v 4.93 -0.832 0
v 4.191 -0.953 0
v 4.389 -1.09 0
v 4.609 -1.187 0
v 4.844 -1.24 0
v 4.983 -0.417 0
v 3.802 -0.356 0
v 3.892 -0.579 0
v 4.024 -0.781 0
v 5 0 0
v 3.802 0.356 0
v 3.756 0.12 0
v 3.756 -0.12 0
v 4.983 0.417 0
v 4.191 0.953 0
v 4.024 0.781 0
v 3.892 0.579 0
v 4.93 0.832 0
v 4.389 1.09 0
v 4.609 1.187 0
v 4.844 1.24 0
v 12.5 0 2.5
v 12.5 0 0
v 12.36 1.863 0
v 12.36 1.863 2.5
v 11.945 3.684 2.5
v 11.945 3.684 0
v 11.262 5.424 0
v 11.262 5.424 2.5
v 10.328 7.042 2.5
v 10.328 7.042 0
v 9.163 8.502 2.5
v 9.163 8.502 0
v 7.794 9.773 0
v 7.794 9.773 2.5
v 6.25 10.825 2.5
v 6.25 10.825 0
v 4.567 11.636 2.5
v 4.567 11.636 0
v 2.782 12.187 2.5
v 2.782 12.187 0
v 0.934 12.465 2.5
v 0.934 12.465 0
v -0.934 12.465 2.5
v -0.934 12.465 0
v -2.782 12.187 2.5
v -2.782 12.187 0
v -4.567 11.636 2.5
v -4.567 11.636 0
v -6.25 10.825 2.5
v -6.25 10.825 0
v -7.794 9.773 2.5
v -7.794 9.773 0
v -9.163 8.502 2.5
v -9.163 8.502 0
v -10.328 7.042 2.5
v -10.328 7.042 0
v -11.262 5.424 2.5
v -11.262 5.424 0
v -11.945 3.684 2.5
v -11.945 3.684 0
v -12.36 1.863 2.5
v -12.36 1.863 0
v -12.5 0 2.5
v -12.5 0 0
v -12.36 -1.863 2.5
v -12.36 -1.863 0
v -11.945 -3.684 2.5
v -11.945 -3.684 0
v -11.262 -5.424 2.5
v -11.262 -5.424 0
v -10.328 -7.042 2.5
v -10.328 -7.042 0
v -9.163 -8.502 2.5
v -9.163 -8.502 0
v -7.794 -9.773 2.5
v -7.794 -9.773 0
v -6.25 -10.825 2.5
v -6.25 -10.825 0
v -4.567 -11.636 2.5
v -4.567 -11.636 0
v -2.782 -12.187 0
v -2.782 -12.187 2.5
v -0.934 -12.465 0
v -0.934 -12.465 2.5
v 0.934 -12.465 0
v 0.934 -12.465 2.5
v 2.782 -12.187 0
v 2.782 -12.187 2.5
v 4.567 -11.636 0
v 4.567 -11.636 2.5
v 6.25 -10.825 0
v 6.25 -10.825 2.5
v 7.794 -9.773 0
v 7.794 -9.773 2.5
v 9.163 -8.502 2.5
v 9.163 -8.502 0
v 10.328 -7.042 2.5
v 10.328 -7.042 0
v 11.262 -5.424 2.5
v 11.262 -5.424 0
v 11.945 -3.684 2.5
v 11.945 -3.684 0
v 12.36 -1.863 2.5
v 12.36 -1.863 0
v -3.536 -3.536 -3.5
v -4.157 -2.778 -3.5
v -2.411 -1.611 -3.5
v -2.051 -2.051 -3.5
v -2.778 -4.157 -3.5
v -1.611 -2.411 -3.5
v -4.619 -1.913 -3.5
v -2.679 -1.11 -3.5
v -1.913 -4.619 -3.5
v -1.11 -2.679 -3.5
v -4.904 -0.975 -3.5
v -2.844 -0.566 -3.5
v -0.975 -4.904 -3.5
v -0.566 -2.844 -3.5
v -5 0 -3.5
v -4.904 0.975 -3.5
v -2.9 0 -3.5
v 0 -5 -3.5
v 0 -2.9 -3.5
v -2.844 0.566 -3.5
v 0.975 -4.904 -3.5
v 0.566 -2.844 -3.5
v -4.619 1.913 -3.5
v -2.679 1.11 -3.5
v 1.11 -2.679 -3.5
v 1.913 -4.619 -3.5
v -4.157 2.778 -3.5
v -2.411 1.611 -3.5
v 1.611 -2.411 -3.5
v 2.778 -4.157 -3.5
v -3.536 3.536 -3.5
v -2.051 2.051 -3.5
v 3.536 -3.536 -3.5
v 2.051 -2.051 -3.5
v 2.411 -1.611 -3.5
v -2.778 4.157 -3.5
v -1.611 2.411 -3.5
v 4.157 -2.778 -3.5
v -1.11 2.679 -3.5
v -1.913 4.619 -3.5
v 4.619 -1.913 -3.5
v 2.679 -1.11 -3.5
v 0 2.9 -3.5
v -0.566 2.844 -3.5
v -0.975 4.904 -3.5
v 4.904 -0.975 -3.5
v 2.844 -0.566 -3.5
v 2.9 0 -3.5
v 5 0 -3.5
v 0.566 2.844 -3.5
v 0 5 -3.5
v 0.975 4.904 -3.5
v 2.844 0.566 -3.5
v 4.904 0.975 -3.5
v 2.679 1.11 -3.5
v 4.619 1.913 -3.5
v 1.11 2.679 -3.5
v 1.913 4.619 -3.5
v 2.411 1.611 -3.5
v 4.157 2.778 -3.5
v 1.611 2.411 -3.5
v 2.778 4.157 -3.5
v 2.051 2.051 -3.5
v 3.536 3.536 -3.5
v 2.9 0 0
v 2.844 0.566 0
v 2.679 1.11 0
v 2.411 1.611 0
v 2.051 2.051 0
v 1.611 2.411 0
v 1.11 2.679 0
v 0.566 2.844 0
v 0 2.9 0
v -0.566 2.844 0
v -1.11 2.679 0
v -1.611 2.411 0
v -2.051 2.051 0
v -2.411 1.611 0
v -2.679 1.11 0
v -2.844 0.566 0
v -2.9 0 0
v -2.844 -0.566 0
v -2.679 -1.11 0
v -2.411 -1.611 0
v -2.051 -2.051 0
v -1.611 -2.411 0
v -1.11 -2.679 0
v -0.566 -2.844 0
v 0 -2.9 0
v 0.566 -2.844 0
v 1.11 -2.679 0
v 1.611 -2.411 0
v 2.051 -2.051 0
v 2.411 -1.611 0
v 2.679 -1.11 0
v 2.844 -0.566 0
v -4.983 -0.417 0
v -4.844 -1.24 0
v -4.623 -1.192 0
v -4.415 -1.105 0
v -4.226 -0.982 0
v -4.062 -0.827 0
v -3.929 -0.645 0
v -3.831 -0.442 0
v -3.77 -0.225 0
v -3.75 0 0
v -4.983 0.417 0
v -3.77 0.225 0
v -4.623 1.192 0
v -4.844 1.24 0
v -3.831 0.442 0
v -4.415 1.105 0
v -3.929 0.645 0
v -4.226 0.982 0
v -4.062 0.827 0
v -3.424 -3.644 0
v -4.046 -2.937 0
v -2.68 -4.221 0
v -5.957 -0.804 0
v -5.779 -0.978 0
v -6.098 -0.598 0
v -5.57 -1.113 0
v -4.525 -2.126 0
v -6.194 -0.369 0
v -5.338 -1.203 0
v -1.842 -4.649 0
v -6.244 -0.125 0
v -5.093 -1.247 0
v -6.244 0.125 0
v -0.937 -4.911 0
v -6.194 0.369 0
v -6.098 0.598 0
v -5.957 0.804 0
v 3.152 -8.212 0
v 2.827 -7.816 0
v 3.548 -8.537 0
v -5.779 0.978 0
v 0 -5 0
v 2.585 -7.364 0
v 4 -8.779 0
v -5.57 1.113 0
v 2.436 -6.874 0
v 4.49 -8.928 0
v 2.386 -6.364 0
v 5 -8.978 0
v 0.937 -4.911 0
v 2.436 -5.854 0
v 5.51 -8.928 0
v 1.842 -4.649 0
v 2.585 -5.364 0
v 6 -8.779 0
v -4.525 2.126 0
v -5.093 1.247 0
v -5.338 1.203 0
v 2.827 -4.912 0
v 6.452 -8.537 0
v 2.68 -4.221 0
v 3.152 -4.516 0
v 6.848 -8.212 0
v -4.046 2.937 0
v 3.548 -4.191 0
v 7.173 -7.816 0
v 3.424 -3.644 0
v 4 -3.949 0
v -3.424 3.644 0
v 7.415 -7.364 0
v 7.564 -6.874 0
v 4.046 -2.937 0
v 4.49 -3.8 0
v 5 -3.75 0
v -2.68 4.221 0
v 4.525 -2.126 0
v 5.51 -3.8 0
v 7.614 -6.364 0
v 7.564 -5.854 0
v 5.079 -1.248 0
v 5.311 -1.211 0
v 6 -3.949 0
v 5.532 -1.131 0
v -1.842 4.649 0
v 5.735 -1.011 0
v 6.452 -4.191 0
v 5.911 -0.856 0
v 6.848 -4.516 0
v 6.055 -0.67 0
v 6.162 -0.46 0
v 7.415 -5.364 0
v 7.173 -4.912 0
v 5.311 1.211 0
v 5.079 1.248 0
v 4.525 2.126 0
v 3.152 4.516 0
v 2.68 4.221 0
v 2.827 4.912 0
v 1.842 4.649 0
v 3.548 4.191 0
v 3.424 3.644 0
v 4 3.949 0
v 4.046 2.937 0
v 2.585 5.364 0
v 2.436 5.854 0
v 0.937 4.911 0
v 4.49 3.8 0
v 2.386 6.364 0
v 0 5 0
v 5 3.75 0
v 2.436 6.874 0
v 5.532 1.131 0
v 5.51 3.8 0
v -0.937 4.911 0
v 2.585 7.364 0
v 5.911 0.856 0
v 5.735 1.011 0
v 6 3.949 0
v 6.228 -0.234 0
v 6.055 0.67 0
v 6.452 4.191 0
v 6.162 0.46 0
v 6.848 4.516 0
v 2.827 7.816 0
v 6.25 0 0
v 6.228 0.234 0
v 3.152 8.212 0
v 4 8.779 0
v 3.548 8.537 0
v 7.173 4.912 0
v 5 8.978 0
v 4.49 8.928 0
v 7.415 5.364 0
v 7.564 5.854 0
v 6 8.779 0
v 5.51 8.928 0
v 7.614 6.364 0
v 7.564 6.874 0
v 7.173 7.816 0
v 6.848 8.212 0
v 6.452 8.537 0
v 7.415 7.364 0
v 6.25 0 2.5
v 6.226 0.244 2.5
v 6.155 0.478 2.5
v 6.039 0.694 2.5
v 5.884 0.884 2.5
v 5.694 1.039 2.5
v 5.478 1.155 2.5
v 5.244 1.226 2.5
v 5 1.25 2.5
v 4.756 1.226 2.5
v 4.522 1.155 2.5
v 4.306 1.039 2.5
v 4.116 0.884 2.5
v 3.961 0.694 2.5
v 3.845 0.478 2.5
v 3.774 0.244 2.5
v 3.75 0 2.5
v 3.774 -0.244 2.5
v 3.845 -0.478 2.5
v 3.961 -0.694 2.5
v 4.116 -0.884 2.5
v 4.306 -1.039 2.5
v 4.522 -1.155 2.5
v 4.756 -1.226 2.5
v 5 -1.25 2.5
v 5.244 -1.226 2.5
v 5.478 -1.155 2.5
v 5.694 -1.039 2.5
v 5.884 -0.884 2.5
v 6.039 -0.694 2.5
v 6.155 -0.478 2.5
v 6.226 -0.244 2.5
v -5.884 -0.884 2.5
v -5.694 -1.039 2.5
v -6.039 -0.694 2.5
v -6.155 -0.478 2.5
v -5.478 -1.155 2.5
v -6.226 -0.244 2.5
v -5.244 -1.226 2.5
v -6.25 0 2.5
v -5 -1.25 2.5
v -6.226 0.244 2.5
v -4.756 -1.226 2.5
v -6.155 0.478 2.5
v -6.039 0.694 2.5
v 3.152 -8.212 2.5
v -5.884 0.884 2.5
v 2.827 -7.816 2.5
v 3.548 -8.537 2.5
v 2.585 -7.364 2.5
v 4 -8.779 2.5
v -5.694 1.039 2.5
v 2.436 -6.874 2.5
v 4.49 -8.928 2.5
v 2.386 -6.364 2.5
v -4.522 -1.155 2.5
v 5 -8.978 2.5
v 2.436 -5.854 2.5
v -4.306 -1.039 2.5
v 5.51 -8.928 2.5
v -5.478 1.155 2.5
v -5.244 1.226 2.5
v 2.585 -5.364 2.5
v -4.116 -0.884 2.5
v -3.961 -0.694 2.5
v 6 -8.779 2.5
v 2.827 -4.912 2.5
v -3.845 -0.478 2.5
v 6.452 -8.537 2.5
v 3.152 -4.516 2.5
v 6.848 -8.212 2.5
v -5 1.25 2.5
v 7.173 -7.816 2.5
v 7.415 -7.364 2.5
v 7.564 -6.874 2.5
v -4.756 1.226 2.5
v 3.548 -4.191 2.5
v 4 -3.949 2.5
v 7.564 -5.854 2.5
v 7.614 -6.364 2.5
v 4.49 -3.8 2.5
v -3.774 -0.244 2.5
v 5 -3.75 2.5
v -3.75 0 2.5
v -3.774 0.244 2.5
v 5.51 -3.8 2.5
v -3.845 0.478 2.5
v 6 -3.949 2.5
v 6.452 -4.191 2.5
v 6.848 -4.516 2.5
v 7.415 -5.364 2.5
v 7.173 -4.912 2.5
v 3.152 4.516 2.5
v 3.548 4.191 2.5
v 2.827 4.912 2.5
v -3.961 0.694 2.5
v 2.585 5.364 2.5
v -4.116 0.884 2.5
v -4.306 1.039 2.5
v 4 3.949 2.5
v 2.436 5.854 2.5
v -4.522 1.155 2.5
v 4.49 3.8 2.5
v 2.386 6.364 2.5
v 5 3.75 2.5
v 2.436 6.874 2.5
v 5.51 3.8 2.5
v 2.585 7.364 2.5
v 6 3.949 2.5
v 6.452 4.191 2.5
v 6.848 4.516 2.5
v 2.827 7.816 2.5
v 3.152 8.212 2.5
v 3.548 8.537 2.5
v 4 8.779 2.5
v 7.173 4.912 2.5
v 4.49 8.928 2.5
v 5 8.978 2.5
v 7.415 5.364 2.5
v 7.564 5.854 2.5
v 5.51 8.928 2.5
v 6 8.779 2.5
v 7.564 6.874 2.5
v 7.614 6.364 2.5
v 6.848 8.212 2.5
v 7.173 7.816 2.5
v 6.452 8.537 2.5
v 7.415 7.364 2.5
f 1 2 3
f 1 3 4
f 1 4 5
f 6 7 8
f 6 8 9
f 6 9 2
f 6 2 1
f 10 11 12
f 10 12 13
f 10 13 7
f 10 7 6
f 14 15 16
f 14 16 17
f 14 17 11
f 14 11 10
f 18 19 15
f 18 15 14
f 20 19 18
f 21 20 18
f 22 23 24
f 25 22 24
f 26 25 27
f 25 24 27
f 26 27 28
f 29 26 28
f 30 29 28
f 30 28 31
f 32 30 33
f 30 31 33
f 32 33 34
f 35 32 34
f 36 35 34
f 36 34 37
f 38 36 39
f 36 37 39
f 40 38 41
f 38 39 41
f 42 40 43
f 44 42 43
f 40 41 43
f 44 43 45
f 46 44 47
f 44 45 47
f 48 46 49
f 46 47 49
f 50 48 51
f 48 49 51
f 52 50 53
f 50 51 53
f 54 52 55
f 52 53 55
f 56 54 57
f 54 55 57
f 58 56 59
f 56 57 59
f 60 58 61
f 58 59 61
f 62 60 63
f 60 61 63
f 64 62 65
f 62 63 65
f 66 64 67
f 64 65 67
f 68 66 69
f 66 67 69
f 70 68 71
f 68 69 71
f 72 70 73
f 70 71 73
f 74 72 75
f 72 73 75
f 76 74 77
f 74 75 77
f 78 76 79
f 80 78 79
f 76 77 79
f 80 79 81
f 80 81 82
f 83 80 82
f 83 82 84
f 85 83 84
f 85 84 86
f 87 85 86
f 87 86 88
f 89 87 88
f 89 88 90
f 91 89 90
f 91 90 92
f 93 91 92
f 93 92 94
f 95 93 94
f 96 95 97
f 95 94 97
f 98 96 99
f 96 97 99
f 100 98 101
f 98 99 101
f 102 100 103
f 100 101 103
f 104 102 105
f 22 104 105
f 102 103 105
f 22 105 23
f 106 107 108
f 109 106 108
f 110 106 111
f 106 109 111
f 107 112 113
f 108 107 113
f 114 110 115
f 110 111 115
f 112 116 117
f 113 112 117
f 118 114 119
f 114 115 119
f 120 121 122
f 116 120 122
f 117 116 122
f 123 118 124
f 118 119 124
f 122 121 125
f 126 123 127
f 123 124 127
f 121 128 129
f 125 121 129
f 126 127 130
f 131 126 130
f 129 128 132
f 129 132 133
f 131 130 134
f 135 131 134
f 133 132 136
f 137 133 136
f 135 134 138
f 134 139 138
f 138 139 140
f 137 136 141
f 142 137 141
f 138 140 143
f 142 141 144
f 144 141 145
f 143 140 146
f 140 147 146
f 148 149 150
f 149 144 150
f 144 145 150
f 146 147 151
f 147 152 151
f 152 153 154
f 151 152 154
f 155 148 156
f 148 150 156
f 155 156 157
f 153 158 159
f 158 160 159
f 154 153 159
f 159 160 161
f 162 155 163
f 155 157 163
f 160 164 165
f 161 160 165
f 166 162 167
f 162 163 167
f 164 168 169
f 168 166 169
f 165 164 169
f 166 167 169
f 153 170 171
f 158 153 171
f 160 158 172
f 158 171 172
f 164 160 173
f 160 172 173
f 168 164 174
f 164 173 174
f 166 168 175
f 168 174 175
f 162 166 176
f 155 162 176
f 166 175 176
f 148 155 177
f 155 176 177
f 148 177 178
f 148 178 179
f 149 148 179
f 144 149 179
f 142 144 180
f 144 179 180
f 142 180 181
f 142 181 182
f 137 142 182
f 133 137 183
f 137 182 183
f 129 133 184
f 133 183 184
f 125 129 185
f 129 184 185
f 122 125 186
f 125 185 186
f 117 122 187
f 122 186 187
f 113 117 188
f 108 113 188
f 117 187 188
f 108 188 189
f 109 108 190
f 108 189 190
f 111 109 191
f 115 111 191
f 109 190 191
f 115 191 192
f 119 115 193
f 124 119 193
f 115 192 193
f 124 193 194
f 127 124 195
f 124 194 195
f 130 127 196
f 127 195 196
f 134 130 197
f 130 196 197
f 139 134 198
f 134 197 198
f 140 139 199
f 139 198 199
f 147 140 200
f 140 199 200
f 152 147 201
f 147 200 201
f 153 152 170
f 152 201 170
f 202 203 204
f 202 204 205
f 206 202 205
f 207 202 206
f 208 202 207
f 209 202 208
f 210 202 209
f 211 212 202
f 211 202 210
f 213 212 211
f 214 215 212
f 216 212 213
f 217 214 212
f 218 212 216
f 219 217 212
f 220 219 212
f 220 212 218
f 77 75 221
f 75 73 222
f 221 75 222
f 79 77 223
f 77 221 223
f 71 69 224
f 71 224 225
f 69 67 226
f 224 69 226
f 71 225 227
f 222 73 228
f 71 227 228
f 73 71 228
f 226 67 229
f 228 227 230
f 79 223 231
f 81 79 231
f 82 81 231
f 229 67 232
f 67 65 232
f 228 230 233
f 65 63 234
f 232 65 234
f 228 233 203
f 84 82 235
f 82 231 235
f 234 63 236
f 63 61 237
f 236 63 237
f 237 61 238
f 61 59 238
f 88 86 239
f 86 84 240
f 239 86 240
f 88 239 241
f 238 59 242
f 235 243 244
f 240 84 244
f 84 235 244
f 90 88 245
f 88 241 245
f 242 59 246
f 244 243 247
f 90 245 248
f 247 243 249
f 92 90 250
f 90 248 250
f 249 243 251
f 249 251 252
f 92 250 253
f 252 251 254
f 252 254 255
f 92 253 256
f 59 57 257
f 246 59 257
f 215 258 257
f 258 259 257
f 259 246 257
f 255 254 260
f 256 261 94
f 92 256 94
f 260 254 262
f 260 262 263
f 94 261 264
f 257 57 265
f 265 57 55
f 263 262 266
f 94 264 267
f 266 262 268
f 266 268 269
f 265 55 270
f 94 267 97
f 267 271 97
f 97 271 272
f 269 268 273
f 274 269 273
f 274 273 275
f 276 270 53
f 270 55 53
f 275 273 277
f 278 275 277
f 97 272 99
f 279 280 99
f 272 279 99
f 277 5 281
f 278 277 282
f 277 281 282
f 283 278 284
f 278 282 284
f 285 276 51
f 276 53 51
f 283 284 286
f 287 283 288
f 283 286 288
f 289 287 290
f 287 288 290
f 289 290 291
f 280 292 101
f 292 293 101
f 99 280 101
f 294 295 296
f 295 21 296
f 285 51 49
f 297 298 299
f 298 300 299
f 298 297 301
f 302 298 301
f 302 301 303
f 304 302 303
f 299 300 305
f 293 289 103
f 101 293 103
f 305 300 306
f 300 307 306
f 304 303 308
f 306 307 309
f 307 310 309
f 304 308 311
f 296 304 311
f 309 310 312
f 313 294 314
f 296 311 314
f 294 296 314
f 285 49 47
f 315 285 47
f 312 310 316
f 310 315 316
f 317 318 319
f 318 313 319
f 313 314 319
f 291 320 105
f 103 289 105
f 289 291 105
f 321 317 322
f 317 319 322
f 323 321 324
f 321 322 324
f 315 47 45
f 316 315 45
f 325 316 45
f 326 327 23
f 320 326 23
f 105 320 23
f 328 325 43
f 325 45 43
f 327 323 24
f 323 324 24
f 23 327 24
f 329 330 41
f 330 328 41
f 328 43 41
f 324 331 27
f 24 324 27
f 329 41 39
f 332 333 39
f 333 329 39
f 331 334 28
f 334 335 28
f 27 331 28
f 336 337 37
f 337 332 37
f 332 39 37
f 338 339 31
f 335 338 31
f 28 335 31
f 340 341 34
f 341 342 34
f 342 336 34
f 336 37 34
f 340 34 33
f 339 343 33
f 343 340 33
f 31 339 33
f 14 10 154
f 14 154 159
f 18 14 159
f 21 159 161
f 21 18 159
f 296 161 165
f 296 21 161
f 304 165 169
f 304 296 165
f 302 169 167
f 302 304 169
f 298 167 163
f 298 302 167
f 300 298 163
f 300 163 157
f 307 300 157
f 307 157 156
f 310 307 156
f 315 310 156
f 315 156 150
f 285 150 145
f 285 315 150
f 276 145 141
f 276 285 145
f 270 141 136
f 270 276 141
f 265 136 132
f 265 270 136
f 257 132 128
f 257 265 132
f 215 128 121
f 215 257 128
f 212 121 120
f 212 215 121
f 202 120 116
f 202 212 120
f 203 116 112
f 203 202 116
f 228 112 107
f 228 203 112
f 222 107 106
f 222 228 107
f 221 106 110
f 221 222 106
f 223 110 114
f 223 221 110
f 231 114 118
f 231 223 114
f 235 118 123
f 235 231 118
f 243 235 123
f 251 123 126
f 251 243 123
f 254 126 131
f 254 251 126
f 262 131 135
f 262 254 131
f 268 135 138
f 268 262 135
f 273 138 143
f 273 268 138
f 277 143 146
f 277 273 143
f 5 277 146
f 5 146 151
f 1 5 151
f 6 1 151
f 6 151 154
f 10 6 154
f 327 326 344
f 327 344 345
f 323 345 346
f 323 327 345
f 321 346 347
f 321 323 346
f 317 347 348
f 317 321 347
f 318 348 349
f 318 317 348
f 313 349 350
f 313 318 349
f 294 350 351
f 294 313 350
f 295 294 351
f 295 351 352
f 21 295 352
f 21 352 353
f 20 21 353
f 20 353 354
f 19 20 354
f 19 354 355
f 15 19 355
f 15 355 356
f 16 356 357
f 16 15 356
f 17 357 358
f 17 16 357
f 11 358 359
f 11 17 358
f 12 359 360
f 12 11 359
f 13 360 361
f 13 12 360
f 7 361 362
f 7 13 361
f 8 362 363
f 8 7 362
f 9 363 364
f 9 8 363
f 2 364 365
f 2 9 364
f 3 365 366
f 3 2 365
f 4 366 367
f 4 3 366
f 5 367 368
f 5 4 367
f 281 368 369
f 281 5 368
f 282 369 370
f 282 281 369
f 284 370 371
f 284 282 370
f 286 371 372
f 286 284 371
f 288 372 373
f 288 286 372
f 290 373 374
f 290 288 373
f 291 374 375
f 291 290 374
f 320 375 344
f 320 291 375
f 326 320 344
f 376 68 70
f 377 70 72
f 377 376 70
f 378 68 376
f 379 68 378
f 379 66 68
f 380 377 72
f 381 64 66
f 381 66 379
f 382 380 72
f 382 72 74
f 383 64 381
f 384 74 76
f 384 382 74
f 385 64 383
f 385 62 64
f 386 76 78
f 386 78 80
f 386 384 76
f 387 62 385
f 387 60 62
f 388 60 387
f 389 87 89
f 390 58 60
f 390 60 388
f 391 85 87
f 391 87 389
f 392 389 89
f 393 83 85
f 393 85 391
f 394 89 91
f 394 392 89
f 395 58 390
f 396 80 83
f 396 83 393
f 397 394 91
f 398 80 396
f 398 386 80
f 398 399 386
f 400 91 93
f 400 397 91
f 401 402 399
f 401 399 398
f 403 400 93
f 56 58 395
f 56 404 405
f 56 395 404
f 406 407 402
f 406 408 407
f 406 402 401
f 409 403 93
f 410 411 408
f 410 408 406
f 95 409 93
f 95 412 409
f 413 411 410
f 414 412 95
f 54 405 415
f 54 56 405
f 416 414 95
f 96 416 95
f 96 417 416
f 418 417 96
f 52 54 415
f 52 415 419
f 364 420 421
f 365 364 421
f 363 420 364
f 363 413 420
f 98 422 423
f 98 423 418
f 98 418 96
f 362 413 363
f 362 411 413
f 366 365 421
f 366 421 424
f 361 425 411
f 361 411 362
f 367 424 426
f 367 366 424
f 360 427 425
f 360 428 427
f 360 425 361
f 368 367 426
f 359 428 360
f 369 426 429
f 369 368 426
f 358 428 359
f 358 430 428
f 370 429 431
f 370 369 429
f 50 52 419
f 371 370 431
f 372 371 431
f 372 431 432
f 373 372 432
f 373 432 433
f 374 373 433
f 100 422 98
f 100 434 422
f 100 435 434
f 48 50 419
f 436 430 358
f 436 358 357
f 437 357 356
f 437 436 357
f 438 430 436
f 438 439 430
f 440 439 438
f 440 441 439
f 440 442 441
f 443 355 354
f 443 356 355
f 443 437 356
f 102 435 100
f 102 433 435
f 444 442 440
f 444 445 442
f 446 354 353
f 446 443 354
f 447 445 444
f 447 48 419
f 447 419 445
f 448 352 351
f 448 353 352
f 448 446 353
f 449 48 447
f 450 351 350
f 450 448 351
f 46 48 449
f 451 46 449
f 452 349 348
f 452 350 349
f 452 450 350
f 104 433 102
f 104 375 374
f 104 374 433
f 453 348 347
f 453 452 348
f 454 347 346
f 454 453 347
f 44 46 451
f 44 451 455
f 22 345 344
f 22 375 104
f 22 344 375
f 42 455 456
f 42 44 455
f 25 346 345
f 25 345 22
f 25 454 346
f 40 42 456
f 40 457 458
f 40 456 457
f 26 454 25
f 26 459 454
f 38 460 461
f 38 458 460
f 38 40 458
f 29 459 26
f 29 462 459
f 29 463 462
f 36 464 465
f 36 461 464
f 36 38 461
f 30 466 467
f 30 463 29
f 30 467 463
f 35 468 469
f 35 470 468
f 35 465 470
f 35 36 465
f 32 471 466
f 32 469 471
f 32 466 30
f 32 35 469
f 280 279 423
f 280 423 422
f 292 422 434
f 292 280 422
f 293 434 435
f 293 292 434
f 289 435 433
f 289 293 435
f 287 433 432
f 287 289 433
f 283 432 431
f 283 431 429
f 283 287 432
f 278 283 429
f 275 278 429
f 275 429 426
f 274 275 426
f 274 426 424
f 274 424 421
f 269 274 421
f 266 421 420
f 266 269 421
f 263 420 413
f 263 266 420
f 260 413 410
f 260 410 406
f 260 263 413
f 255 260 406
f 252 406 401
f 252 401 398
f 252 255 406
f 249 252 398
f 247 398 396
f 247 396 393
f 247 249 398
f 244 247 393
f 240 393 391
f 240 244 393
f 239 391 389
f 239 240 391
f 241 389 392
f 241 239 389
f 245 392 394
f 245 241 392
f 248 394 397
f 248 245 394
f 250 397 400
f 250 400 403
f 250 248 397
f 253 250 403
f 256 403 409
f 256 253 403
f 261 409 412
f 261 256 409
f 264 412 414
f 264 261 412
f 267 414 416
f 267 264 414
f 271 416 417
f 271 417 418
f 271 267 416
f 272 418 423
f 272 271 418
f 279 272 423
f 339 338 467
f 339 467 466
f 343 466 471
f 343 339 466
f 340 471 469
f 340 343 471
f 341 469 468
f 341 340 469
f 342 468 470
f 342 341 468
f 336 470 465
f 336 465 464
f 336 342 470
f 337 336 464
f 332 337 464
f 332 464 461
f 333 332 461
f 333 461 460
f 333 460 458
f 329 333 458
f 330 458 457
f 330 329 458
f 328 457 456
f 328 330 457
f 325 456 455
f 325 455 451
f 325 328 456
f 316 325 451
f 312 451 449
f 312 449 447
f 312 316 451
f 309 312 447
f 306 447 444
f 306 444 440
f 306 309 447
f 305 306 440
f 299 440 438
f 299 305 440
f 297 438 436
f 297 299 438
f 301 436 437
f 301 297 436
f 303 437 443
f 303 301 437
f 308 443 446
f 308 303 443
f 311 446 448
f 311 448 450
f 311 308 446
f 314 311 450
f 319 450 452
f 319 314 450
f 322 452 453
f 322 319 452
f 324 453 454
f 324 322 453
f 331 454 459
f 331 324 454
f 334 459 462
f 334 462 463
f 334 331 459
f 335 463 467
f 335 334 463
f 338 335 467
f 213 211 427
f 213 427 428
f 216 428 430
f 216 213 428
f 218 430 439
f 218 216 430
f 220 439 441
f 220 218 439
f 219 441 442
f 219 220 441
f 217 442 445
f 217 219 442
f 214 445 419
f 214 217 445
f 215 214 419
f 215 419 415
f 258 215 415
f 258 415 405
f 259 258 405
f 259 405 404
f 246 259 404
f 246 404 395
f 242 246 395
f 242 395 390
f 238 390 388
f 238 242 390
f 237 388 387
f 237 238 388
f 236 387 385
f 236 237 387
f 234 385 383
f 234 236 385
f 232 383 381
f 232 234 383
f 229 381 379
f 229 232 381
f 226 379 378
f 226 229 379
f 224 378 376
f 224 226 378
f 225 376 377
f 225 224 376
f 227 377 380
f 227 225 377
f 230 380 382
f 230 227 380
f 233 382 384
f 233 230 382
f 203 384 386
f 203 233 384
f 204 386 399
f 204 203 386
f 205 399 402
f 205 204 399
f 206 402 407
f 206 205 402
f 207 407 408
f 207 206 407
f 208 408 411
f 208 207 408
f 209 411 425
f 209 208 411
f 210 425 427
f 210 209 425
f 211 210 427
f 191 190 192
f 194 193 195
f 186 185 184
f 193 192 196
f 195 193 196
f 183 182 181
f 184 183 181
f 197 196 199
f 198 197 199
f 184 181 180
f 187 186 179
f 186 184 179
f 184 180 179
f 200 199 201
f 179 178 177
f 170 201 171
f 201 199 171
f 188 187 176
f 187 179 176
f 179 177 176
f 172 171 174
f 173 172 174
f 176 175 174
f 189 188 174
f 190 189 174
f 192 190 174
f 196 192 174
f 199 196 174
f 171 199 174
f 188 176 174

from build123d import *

# Parameters (mm, degrees)
ESQUISSE1_R             = 12.5
ESQUISSE1_R_2           = 1.25
ESQUISSE1_R_3           = 2.613961031
DISQUE_O25_DEPTH        = 2.5
ESQUISSE2_R             = 5
ESQUISSE2_R_2           = 2.9
MOYEU_CANNELE_25T_DEPTH = 3.5


with BuildPart() as part:
    # Esquisse1 → Disque O25 (new body)
    with BuildSketch(Plane.XY):
        Circle(ESQUISSE1_R)
        with Locations((5, 0)):
            Circle(ESQUISSE1_R_2, mode=Mode.SUBTRACT)
        with Locations((-5, 0)):
            Circle(ESQUISSE1_R_2, mode=Mode.SUBTRACT)
        with Locations((5, 6.363961031)):
            Circle(ESQUISSE1_R_3, mode=Mode.SUBTRACT)
        with Locations((5, -6.363961031)):
            Circle(ESQUISSE1_R_3, mode=Mode.SUBTRACT)
    extrude(amount=DISQUE_O25_DEPTH)

    # Esquisse2 → Moyeu cannele 25T (add)
    with BuildSketch(Plane.XY):
        Circle(ESQUISSE2_R)
        Circle(ESQUISSE2_R_2, mode=Mode.SUBTRACT)
    extrude(amount=-MOYEU_CANNELE_25T_DEPTH)


solid = part.part
